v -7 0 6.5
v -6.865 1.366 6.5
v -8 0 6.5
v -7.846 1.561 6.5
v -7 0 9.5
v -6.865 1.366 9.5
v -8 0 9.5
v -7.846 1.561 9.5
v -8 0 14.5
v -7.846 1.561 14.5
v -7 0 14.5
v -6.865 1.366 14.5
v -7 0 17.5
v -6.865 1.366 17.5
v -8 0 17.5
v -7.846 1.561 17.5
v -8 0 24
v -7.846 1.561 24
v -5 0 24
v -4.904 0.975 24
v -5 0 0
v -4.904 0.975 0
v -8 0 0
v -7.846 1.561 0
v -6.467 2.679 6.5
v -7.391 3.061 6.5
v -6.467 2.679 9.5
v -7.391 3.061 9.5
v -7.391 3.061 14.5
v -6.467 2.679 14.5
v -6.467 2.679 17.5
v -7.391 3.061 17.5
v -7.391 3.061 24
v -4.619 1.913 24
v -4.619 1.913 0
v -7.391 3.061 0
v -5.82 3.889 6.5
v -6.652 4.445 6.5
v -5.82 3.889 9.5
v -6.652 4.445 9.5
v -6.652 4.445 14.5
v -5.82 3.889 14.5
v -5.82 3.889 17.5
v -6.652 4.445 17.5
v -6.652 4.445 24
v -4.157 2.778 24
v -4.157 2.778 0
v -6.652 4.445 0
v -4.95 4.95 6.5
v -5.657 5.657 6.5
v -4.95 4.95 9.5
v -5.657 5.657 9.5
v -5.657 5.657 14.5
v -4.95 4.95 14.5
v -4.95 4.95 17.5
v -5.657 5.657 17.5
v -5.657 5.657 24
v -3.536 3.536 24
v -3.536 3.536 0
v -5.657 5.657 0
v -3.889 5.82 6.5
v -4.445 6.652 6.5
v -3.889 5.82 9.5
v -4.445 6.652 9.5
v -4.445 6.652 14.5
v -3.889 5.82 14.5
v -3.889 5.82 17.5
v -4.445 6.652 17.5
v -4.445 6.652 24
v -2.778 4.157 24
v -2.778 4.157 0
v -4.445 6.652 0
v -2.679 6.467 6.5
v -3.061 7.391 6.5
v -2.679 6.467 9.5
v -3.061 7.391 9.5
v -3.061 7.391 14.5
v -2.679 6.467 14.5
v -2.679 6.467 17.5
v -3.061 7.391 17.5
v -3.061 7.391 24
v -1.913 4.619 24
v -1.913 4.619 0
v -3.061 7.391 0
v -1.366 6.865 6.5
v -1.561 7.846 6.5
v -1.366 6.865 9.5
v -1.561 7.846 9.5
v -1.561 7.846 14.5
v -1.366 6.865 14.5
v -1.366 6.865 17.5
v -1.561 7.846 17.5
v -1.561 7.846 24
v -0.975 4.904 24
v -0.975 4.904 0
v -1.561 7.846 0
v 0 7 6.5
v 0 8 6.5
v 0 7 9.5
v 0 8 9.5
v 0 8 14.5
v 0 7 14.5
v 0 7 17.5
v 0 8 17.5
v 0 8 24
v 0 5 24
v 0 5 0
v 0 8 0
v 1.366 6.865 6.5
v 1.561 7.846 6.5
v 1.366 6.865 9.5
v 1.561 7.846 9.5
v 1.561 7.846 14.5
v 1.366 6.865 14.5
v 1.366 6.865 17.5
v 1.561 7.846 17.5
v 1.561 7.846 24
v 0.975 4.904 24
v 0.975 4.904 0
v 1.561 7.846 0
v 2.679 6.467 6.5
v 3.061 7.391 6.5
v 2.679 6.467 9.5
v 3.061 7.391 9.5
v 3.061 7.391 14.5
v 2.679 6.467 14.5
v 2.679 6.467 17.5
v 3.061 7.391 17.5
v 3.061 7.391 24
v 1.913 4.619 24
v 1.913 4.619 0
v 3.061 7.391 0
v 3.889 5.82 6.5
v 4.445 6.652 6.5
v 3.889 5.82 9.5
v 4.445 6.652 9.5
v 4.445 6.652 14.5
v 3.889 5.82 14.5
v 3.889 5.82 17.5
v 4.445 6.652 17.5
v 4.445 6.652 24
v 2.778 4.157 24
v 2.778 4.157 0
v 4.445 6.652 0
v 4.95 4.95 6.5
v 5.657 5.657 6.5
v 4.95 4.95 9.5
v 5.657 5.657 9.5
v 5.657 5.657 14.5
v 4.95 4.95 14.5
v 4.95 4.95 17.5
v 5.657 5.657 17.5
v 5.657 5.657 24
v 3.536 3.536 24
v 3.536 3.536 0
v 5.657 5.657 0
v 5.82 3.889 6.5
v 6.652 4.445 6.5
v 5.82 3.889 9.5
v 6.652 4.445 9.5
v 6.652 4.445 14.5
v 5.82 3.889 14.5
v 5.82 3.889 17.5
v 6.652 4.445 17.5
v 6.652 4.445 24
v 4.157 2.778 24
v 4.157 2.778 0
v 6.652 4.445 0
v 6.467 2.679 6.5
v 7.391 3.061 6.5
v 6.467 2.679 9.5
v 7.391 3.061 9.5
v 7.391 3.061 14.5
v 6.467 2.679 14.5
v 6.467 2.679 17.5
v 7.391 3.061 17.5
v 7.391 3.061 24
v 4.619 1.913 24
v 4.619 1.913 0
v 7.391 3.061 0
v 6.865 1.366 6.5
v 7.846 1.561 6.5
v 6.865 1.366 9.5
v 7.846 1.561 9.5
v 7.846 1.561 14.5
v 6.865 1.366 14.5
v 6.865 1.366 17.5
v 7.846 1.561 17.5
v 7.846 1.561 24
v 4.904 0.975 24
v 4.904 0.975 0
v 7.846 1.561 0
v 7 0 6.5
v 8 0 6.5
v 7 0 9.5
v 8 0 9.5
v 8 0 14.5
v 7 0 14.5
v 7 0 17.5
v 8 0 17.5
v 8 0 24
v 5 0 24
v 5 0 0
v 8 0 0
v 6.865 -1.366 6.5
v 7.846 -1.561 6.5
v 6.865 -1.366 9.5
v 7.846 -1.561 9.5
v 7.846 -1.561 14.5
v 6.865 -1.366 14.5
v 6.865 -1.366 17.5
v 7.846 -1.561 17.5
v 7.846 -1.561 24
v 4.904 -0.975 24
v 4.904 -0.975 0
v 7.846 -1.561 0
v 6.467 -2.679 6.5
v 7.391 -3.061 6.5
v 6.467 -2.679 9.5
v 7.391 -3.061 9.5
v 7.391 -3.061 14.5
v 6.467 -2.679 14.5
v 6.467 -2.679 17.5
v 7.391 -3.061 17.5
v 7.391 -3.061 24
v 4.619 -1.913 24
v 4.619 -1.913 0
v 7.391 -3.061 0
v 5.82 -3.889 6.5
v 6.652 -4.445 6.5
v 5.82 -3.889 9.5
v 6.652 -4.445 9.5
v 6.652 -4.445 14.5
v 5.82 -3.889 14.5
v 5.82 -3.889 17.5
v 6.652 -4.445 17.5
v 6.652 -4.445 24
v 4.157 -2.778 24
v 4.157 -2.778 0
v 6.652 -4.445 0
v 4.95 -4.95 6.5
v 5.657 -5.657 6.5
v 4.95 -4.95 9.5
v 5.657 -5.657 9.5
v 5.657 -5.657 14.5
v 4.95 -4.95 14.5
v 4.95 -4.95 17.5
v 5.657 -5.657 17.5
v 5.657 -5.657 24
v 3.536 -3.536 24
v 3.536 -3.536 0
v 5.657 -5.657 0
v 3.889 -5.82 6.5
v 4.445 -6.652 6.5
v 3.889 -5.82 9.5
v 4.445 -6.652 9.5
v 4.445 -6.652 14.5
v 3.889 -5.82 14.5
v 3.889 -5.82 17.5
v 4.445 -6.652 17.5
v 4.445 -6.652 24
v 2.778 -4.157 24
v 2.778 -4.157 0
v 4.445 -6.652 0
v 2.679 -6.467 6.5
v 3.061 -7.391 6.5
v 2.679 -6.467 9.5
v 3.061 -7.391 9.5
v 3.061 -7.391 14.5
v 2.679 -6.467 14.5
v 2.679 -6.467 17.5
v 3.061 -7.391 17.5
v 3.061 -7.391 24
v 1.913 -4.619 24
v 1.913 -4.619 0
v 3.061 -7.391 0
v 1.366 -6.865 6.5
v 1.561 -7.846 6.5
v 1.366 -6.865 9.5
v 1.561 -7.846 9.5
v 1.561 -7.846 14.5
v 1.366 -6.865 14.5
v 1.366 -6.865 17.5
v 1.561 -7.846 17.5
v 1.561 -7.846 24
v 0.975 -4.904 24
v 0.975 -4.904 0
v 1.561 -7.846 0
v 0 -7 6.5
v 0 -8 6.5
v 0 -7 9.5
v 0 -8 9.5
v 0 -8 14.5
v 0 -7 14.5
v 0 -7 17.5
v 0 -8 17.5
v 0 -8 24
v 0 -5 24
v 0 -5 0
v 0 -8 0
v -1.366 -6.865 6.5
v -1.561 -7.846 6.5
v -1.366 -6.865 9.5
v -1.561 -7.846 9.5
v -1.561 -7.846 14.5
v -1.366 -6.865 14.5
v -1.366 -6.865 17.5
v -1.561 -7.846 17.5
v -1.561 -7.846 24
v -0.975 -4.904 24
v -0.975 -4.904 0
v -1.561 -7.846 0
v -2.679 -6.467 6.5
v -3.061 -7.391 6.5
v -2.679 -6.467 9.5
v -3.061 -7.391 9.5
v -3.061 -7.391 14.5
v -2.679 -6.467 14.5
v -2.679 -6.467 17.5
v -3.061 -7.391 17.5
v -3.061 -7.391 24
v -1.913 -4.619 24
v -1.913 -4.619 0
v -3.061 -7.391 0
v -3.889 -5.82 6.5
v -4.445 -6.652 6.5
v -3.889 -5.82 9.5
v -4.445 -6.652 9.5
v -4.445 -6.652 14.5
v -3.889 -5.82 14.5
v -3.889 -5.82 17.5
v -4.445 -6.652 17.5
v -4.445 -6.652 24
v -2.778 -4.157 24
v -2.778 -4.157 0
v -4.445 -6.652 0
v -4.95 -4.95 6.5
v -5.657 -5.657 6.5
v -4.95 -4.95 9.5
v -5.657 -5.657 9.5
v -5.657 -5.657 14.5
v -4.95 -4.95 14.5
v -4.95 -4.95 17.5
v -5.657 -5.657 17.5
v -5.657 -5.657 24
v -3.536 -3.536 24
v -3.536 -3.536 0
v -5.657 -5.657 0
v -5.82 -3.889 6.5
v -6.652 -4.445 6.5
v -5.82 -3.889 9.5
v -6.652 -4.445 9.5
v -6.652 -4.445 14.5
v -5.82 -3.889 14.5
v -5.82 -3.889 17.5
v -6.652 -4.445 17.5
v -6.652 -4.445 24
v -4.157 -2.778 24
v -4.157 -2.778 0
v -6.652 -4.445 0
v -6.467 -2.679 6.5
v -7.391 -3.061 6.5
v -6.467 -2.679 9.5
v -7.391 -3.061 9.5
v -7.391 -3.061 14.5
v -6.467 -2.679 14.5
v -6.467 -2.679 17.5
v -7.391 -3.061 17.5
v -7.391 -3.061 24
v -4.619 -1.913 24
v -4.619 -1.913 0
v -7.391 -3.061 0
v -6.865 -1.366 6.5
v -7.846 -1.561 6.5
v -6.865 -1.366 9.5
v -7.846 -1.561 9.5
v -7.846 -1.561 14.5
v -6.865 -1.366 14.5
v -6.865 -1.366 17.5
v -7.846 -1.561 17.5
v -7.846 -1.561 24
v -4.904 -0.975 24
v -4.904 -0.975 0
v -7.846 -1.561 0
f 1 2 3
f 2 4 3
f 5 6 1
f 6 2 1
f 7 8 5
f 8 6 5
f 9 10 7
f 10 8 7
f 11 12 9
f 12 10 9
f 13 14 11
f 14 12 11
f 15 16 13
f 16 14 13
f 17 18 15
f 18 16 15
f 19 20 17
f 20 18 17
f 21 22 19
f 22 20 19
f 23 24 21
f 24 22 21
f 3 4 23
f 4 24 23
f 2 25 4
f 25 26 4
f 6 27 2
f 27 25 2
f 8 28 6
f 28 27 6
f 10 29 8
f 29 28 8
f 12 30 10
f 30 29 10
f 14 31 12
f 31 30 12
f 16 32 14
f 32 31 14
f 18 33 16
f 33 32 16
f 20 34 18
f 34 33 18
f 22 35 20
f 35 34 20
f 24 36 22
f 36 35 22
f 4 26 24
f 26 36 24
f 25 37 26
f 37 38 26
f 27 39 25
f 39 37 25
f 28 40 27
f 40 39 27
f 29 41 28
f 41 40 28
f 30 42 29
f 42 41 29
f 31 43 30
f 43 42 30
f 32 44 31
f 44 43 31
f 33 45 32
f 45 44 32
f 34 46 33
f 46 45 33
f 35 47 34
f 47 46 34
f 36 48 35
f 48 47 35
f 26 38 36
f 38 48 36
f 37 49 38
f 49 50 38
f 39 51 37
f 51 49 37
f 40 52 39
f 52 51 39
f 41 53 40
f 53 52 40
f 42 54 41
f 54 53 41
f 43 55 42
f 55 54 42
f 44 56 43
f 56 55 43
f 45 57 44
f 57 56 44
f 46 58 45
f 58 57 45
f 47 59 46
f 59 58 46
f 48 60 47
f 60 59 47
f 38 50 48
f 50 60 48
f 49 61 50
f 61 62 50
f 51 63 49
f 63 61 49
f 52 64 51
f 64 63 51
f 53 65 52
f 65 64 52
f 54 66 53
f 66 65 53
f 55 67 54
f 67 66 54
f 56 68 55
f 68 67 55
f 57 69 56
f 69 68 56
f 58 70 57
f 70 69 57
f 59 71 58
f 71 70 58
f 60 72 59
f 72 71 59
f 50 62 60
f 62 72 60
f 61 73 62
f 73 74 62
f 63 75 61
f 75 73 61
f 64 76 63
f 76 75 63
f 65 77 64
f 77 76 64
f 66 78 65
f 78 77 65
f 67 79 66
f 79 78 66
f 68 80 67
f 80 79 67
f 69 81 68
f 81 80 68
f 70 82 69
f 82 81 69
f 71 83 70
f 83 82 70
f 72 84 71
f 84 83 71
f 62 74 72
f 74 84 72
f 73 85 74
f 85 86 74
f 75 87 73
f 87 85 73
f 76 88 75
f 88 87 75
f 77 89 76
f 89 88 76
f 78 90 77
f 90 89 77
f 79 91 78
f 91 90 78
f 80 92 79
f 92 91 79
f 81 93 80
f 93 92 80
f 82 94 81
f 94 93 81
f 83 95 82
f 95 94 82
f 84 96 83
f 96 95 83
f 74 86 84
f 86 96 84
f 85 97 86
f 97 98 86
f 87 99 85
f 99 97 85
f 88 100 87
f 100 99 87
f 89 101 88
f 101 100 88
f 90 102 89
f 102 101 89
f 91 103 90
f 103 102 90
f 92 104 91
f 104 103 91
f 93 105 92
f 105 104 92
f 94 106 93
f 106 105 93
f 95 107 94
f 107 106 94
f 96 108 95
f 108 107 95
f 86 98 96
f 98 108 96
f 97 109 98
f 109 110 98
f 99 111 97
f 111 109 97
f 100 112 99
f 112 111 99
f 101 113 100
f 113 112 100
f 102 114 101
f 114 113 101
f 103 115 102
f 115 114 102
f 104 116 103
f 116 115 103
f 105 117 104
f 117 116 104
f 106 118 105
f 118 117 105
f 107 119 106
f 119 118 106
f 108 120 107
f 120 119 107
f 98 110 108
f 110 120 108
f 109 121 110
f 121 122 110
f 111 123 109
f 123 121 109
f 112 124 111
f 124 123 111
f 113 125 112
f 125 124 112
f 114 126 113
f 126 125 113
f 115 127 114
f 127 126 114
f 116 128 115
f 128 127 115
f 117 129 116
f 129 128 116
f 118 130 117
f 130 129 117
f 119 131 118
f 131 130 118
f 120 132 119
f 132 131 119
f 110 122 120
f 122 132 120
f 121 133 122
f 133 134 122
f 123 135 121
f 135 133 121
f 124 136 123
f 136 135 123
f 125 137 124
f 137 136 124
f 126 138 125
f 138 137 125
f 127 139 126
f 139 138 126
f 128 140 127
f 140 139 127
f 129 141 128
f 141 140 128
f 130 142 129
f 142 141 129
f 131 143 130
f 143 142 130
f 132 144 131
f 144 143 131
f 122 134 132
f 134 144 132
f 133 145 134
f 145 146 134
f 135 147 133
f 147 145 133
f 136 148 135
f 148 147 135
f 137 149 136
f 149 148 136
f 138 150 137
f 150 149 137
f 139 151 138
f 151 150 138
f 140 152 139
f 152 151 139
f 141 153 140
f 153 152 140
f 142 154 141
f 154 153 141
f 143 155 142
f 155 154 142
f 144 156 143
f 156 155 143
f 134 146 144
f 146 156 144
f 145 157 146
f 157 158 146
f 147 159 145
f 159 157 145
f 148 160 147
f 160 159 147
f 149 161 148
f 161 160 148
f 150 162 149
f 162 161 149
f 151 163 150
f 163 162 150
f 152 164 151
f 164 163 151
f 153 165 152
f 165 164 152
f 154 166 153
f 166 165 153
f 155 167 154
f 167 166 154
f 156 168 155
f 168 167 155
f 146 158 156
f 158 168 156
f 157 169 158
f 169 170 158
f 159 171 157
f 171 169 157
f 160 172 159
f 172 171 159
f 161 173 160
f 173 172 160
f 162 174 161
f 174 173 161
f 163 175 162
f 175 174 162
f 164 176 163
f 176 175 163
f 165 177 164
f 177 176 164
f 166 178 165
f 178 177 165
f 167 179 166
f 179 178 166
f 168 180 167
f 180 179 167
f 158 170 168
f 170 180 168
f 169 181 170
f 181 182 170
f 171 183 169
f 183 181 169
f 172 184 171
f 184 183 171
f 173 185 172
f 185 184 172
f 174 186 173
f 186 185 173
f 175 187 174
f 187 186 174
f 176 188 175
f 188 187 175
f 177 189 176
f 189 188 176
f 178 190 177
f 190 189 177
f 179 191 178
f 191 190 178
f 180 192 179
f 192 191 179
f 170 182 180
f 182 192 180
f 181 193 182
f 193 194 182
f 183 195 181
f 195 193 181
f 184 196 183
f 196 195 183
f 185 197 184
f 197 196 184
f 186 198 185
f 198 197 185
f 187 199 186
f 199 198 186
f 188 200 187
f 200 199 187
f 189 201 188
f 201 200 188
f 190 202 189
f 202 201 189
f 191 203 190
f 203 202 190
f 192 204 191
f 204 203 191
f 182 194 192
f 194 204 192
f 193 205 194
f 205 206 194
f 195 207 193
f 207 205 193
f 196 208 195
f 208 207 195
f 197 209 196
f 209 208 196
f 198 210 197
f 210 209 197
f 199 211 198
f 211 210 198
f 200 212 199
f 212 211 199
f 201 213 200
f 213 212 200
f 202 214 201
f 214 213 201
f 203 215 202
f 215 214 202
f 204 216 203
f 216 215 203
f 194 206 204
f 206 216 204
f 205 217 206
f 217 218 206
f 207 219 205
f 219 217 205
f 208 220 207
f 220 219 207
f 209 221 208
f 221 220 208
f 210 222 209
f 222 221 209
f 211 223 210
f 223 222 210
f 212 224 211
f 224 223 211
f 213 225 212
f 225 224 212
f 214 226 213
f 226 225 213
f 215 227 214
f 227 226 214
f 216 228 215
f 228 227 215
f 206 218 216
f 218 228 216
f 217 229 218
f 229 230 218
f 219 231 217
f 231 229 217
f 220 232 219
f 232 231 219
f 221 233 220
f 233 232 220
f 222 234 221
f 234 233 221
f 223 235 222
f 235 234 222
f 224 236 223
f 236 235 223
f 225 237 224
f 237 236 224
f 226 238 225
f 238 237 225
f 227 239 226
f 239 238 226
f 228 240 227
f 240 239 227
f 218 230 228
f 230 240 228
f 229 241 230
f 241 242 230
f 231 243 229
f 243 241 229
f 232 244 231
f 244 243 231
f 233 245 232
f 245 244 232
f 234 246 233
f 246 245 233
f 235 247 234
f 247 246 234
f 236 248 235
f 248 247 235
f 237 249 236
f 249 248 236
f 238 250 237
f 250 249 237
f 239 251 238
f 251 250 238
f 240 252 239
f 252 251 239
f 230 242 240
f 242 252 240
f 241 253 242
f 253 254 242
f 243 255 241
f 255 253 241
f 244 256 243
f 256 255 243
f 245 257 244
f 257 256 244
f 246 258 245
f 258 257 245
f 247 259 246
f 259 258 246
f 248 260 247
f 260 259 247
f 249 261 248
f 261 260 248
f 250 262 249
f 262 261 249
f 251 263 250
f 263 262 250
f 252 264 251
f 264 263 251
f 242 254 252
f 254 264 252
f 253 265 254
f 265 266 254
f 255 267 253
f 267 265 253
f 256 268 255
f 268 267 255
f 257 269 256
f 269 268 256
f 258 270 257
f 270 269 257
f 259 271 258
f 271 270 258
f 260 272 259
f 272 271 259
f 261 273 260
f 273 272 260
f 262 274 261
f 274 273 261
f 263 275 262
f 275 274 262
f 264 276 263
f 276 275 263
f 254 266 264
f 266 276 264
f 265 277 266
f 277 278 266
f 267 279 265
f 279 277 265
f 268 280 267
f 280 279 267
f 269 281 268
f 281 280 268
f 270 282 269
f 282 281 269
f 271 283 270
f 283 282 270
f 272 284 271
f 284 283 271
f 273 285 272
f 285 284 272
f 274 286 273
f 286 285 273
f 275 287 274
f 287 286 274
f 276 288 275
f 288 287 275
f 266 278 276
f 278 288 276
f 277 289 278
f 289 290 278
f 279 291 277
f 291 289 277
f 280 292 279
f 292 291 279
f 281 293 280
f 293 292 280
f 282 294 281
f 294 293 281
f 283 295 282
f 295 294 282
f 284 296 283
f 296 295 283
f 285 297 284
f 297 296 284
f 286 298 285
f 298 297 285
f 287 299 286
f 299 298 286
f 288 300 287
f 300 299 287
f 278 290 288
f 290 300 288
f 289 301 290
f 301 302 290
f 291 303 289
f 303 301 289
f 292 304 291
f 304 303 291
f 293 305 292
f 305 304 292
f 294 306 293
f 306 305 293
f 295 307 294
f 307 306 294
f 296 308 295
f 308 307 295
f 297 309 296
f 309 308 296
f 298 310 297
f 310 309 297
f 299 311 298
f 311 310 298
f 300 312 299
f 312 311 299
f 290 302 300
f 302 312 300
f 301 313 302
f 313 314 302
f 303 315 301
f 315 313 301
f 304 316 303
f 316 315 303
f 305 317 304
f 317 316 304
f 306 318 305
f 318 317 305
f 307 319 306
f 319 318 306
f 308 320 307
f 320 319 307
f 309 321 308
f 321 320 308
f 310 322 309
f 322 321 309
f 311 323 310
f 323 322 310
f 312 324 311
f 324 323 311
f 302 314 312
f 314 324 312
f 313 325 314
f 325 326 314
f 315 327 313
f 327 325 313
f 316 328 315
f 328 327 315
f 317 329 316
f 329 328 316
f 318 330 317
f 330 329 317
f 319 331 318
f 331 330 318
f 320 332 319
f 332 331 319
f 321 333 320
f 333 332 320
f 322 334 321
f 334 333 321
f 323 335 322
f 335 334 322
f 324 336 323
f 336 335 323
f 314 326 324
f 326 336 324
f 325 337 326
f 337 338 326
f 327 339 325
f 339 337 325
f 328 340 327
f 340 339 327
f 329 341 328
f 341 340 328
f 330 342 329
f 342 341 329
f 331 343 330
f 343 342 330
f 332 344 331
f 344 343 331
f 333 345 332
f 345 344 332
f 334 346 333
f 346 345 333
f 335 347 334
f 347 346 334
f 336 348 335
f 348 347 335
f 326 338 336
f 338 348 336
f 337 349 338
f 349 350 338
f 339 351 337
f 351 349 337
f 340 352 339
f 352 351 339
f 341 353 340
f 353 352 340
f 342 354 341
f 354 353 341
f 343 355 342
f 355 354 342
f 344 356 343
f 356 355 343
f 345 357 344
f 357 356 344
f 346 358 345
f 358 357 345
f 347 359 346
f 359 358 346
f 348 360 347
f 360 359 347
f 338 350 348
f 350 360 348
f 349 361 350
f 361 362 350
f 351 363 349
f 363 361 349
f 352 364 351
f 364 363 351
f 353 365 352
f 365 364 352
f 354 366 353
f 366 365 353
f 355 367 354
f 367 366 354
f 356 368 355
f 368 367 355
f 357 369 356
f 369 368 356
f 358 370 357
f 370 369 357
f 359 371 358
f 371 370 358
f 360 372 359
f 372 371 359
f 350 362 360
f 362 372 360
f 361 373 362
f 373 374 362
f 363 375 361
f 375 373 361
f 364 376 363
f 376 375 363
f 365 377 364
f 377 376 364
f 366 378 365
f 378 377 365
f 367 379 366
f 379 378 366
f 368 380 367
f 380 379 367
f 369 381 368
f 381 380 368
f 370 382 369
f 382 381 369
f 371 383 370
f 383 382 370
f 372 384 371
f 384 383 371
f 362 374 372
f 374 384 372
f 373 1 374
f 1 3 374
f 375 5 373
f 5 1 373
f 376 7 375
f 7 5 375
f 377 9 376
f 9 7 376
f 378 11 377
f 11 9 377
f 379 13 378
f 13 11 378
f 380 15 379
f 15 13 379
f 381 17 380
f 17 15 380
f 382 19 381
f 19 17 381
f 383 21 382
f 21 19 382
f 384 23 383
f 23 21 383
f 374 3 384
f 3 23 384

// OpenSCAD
$fn = 32;

// ----------------------------------------------------------------------
// Grooved revolve: stepped, bore R5
// ----------------------------------------------------------------------

// --- parameters (mm) ---
bore_r = 5;               // bore radius
outer_r = 8;              // outer radius of the body
total_h = 24;             // overall height, Z
wall = 3;                 // radial wall thickness
groove_w = 3;             // groove width
groove_d = 1;             // groove depth
grooves = 2;              // number of outer grooves
fit_tol = 0.05;           // declared fit tolerance (prompt contract)
free_tol = 0.2;           // declared free tolerance (prompt contract)

bbox_x = 2 * outer_r;  // full diameter
bore_d = 2 * bore_r;  // bore diameter
body_d = 2 * outer_r;  // body diameter
revolve_angle = 360;  // full turn around the Z axis

profile = [[5, 0], [8, 0], [8, 6.5], [7, 6.5], [7, 9.5], [8, 9.5], [8, 14.5], [7, 14.5], [7, 17.5], [8, 17.5], [8, 24], [5, 24]];  // primary outline, 12 points, counter clockwise

// --- the one profile operation ---
rotate_extrude(angle = revolve_angle) polygon(points = profile);
